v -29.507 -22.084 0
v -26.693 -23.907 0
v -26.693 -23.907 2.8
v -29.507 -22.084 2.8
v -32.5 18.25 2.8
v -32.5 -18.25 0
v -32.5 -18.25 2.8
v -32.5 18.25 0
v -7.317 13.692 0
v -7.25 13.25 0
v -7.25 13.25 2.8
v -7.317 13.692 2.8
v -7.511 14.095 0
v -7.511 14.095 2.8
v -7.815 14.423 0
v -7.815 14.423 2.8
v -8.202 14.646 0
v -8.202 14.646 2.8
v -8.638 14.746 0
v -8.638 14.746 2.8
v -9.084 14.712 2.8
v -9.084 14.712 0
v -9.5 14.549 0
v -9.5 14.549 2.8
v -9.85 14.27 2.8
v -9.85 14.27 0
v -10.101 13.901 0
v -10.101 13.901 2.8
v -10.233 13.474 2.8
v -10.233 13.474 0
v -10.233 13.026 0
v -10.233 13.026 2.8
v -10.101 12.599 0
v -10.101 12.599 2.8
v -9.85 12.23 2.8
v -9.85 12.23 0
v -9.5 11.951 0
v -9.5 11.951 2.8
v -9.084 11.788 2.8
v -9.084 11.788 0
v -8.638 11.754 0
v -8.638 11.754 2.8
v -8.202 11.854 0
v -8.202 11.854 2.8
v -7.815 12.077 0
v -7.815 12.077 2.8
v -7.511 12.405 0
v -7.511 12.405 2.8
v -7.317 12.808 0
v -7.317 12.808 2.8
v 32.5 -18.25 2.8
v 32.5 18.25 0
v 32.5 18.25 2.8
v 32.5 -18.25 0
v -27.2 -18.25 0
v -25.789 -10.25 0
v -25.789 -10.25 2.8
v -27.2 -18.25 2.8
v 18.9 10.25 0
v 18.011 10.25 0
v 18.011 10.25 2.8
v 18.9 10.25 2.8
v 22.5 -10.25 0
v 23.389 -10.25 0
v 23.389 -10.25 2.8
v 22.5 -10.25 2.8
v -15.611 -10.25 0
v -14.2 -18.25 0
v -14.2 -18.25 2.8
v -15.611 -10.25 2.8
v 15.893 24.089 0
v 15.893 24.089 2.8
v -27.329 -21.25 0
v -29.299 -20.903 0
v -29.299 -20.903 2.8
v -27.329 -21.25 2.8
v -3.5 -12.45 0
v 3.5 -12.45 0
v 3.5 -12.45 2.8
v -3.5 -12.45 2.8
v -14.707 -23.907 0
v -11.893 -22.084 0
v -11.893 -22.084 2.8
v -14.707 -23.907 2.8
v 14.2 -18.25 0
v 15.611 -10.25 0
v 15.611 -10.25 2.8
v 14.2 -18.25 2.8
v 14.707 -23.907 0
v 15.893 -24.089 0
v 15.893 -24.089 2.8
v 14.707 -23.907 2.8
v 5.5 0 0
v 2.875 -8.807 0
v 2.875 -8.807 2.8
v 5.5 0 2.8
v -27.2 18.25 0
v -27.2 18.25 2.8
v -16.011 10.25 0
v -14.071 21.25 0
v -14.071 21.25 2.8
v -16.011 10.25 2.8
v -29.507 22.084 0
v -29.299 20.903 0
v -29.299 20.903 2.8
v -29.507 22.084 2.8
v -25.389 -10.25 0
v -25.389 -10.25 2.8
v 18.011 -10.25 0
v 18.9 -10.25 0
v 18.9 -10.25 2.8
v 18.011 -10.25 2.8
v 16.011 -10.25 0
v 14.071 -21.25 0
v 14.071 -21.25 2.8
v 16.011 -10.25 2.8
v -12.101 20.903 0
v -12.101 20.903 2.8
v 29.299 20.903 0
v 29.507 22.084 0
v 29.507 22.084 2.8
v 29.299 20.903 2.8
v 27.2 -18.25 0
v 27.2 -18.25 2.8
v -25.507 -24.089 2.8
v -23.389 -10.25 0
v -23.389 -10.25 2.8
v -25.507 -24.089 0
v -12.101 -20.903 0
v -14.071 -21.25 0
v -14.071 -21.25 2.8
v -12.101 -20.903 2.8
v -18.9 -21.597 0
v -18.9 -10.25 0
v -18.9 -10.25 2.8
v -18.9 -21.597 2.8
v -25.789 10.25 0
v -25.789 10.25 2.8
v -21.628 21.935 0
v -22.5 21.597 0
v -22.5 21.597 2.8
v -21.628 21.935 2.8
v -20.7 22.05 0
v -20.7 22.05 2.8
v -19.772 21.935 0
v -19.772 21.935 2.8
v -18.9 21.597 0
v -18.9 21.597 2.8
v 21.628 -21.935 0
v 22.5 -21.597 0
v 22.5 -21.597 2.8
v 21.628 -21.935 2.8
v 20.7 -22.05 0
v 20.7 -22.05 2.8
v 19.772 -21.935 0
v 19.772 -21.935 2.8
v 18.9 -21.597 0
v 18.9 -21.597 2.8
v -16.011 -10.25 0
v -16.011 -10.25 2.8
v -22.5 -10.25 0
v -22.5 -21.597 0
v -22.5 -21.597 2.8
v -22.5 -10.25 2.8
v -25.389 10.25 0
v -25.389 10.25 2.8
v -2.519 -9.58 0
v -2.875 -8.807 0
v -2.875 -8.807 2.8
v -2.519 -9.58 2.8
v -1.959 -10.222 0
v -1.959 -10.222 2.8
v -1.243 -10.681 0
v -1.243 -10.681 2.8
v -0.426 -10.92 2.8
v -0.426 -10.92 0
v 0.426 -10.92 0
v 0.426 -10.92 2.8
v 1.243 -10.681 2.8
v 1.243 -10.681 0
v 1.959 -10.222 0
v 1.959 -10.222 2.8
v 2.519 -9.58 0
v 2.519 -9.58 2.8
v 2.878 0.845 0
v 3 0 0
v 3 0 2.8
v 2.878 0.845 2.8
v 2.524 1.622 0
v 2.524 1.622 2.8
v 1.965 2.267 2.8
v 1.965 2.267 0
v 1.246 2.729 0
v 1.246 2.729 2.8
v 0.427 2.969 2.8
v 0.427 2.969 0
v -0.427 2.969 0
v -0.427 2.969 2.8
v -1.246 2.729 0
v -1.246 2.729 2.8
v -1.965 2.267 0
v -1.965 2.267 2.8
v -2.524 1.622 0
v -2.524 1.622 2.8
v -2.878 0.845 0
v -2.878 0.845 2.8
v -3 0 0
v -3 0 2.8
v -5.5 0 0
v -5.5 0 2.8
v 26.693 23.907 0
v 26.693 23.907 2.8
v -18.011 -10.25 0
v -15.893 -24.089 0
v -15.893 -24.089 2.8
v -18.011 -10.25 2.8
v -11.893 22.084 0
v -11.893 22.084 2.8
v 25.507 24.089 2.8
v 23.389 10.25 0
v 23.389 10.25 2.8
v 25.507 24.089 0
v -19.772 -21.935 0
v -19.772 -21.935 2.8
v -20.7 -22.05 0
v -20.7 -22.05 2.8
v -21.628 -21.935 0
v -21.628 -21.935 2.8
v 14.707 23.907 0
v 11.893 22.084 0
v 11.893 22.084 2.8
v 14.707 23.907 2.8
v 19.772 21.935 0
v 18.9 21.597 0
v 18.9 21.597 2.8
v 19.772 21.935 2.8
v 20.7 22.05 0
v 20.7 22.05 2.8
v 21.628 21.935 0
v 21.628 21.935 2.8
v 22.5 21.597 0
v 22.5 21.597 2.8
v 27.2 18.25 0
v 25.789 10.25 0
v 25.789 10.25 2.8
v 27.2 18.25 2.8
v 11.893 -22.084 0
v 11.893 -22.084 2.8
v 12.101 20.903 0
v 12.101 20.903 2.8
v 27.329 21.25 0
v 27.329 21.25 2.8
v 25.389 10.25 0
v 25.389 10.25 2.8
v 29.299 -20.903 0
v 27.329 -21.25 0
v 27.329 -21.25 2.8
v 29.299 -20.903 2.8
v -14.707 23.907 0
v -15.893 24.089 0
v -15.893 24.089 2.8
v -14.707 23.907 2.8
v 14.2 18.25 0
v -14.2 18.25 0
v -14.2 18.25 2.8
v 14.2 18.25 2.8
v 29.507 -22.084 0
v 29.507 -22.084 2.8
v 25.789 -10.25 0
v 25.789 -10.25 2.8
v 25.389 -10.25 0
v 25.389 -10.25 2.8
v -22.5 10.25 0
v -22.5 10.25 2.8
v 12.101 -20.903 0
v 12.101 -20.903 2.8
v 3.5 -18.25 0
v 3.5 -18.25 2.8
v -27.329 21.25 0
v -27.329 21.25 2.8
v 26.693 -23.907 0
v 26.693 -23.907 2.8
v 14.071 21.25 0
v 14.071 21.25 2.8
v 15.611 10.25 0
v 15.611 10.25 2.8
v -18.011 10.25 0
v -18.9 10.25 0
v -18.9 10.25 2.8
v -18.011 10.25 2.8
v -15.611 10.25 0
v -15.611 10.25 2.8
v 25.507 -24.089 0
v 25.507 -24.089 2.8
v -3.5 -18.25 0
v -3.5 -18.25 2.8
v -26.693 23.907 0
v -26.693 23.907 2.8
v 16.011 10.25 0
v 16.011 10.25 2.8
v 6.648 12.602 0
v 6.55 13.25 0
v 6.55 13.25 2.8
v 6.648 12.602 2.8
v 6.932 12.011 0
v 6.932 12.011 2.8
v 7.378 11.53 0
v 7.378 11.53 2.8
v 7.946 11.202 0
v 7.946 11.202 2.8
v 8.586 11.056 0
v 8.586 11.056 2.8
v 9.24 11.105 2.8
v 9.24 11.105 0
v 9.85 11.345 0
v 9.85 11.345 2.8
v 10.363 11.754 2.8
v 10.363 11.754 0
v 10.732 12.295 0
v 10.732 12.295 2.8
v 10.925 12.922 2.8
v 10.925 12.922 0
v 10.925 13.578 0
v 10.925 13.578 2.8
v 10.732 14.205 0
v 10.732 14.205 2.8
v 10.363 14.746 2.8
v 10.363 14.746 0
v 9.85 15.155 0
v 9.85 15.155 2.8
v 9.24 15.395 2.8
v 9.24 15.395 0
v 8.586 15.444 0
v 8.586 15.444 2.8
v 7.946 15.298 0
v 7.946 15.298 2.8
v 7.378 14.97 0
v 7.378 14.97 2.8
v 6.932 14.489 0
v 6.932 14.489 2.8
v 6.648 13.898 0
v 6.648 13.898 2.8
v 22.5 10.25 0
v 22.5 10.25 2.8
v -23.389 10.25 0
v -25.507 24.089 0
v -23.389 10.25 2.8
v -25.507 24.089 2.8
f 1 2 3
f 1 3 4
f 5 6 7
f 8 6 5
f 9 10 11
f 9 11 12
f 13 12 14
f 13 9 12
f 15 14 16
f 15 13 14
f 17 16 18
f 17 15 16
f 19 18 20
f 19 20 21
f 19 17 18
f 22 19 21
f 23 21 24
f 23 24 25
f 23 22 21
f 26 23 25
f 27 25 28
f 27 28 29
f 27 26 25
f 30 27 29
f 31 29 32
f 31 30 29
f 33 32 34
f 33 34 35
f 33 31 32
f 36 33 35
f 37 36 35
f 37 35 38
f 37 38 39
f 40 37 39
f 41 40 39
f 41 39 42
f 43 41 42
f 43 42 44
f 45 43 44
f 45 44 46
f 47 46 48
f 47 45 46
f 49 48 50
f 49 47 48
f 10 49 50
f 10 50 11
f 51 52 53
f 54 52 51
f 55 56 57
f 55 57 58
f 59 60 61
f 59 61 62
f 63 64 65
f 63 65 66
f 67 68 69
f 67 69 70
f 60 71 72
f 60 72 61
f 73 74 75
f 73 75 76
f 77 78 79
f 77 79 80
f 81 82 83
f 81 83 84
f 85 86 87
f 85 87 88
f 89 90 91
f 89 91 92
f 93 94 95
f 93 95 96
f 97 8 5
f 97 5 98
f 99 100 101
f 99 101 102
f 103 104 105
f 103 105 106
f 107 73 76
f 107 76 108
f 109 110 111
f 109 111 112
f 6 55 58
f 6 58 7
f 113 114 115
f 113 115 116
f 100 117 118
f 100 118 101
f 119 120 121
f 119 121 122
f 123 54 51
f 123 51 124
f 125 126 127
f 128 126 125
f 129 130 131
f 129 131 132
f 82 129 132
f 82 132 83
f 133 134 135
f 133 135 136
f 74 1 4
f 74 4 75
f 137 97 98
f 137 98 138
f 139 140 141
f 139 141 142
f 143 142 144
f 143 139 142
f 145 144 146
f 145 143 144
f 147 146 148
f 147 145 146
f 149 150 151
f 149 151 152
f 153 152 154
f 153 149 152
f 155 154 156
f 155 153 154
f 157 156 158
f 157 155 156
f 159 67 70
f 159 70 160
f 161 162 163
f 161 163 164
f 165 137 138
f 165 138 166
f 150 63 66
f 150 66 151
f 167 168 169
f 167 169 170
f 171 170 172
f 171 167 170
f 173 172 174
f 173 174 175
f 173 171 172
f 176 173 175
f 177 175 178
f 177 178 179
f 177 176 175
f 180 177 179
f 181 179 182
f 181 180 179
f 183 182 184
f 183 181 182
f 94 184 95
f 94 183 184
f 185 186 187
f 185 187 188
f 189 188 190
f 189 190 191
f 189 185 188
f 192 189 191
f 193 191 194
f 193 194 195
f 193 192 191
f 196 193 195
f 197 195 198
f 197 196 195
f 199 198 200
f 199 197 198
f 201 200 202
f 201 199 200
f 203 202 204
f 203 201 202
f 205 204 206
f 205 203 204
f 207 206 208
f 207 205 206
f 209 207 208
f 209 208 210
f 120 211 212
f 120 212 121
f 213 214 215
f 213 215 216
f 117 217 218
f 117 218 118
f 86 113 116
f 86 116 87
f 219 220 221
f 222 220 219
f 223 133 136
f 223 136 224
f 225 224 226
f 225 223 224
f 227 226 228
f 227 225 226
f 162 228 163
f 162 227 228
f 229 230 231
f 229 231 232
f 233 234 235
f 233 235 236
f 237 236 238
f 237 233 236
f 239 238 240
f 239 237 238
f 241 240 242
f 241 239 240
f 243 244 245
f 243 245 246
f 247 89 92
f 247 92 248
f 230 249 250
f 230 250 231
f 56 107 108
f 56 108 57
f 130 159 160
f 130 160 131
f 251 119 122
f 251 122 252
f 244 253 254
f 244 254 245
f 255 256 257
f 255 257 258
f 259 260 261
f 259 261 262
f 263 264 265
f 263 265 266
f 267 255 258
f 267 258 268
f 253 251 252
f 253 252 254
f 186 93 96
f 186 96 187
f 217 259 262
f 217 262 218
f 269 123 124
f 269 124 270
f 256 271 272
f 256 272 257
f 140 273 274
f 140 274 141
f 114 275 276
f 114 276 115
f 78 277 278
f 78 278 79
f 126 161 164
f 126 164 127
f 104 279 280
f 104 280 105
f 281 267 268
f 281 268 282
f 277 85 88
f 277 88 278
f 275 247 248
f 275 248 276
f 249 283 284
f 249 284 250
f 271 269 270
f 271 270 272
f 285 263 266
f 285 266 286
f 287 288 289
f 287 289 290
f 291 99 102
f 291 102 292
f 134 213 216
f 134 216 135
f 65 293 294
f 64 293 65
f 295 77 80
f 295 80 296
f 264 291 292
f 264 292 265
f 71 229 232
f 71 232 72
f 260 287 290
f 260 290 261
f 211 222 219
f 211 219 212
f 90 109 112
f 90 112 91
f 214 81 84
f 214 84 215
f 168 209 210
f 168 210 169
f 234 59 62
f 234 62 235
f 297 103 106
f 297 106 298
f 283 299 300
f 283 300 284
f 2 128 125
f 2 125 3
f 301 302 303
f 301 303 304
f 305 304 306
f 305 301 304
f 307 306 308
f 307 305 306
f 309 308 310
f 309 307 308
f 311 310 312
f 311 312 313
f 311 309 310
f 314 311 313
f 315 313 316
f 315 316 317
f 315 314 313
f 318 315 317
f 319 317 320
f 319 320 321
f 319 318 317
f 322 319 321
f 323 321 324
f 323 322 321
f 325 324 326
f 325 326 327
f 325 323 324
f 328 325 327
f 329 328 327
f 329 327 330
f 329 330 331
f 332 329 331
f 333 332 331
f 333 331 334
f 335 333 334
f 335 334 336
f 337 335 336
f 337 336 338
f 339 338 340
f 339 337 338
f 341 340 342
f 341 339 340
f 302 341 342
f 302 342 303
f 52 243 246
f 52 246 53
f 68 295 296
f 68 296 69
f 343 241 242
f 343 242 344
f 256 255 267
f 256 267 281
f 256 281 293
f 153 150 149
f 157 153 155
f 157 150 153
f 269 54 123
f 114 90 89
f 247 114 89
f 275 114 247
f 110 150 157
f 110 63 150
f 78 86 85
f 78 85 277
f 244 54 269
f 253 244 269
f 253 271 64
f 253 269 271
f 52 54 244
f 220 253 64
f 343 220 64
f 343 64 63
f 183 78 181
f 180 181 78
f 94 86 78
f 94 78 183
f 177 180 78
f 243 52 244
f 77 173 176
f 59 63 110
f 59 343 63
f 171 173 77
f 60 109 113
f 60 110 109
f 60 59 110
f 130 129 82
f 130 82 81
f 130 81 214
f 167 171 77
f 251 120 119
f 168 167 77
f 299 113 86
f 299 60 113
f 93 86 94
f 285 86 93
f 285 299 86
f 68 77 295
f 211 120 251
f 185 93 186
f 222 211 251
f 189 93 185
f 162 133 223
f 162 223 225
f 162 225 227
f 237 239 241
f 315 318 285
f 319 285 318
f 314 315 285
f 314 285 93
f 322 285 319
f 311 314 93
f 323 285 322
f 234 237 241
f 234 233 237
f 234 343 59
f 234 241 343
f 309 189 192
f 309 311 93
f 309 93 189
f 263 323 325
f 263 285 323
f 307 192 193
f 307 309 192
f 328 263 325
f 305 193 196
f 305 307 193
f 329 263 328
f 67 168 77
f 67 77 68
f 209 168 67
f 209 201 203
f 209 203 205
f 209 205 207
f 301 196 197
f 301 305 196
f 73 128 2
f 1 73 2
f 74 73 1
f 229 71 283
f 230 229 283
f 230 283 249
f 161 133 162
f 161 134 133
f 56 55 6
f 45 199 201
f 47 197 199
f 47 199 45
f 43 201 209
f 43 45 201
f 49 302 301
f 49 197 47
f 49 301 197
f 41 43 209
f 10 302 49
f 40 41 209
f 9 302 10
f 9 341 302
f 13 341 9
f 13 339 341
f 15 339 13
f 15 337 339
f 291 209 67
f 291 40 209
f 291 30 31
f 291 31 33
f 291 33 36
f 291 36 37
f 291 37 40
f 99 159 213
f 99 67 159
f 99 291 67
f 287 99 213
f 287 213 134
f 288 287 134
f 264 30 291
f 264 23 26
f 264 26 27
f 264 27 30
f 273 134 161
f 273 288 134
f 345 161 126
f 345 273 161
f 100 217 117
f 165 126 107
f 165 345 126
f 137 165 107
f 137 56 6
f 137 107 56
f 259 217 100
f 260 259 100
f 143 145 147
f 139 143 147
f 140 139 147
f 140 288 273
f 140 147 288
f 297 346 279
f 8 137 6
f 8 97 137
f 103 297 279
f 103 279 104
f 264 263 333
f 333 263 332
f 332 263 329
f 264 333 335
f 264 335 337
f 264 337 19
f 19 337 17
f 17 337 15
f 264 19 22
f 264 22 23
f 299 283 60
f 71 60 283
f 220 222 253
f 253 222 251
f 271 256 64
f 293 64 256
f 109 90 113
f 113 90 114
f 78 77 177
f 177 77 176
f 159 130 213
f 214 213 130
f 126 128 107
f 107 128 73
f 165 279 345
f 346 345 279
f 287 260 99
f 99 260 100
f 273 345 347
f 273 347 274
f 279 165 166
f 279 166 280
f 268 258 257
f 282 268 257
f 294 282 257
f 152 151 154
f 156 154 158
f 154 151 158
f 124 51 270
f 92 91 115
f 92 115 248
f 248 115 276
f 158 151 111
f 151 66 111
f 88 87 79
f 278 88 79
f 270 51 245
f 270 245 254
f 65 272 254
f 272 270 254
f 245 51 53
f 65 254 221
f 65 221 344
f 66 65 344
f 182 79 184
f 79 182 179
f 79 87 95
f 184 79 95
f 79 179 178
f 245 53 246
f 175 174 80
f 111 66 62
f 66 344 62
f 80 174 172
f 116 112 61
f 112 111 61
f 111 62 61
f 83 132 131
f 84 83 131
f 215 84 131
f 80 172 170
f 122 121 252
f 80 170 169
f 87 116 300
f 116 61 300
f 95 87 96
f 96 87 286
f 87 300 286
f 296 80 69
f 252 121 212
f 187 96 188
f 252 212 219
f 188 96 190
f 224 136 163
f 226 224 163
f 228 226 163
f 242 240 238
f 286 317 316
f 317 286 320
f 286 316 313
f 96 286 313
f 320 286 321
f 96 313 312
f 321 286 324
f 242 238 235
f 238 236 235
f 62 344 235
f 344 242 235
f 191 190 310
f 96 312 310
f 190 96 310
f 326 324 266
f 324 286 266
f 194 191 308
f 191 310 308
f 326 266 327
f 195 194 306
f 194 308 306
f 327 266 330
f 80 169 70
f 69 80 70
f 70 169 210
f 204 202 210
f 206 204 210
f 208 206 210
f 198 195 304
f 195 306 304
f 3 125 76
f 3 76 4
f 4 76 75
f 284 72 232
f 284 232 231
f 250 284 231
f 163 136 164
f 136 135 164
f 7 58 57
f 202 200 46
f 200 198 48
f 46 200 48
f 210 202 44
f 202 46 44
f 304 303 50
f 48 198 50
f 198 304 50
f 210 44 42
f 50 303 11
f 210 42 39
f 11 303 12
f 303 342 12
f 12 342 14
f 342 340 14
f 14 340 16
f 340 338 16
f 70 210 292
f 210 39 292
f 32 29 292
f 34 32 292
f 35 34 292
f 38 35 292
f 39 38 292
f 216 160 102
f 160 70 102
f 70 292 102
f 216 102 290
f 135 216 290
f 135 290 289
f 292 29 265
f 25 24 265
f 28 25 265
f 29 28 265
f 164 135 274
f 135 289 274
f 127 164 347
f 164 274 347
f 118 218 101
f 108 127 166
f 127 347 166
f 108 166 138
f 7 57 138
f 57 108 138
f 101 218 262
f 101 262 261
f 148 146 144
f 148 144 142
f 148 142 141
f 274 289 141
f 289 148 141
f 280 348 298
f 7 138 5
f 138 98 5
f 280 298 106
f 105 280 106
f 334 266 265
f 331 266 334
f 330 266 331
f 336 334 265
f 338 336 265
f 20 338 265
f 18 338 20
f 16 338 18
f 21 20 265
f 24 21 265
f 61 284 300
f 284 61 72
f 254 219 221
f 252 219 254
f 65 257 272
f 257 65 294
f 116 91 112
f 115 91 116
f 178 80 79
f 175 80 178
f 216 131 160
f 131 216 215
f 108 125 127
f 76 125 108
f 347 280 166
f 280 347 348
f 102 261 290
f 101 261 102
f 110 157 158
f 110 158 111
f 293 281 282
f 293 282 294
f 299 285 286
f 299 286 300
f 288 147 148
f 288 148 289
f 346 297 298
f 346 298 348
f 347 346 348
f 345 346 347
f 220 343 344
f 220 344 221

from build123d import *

# Parameters (mm, degrees)
MODEL_R                 = 1.5
MODEL_R_2               = 2.2
P_IDAT_VYSUNUT_M1_DEPTH = 2.8


with BuildPart() as part:
    # Model → Přidat vysunutím1 (new body)
    with BuildSketch(Plane.XY):
        with BuildLine():
            Line((-14.2, 18.25), (14.2, 18.25))
            Line((14.2, 18.25), (15.610615846, 10.25))
            Line((15.610615846, 10.25), (16.010615846, 10.25))
            Line((16.010615846, 10.25), (14.071019058, 21.25))
            Line((14.071019058, 21.25), (12.101403552, 20.902703645))
            Line((12.101403552, 20.902703645), (11.893025739, 22.084472948))
            Line((11.893025739, 22.084472948), (14.706771698, 23.907401431))
            Line((14.706771698, 23.907401431), (15.892964362, 24.088914415))
            Line((15.892964362, 24.088914415), (18.010615846, 10.25))
            Line((18.010615846, 10.25), (18.9, 10.25))
            Line((18.9, 10.25), (18.9, 21.596640106))
            ThreePointArc((18.9, 21.596640106), (20.7, 22.05), (22.5, 21.596640106))
            Line((22.5, 21.596640106), (22.5, 10.25))
            Line((22.5, 10.25), (23.389384154, 10.25))
            Line((23.389384154, 10.25), (25.507035638, 24.088914415))
            Line((25.507035638, 24.088914415), (26.693228302, 23.907401431))
            Line((26.693228302, 23.907401431), (29.506974261, 22.084472948))
            Line((29.506974261, 22.084472948), (29.298596448, 20.902703645))
            Line((29.298596448, 20.902703645), (27.328980942, 21.25))
            Line((27.328980942, 21.25), (25.389384154, 10.25))
            Line((25.389384154, 10.25), (25.789384154, 10.25))
            Line((25.789384154, 10.25), (27.2, 18.25))
            Line((27.2, 18.25), (32.5, 18.25))
            Line((32.5, 18.25), (32.5, -18.25))
            Line((32.5, -18.25), (27.2, -18.25))
            Line((27.2, -18.25), (25.789384154, -10.25))
            Line((25.789384154, -10.25), (25.389384154, -10.25))
            Line((25.389384154, -10.25), (27.328980942, -21.25))
            Line((27.328980942, -21.25), (29.298596448, -20.902703645))
            Line((29.298596448, -20.902703645), (29.506974261, -22.084472948))
            Line((29.506974261, -22.084472948), (26.693228302, -23.907401431))
            Line((26.693228302, -23.907401431), (25.507035638, -24.088914415))
            Line((25.507035638, -24.088914415), (23.389384154, -10.25))
            Line((23.389384154, -10.25), (22.5, -10.25))
            Line((22.5, -10.25), (22.5, -21.596640106))
            ThreePointArc((22.5, -21.596640106), (20.7, -22.05), (18.9, -21.596640106))
            Line((18.9, -21.596640106), (18.9, -10.25))
            Line((18.9, -10.25), (18.010615846, -10.25))
            Line((18.010615846, -10.25), (15.892964362, -24.088914415))
            Line((15.892964362, -24.088914415), (14.706771698, -23.907401431))
            Line((14.706771698, -23.907401431), (11.893025739, -22.084472948))
            Line((11.893025739, -22.084472948), (12.101403552, -20.902703645))
            Line((12.101403552, -20.902703645), (14.071019058, -21.25))
            Line((14.071019058, -21.25), (16.010615846, -10.25))
            Line((16.010615846, -10.25), (15.610615846, -10.25))
            Line((15.610615846, -10.25), (14.2, -18.25))
            Line((14.2, -18.25), (3.5, -18.25))
            Line((3.5, -18.25), (3.5, -12.45))
            Line((3.5, -12.45), (-3.5, -12.45))
            Line((-3.5, -12.45), (-3.5, -18.25))
            Line((-3.5, -18.25), (-14.2, -18.25))
            Line((-14.2, -18.25), (-15.610615846, -10.25))
            Line((-15.610615846, -10.25), (-16.010615846, -10.25))
            Line((-16.010615846, -10.25), (-14.071019058, -21.25))
            Line((-14.071019058, -21.25), (-12.101403552, -20.902703645))
            Line((-12.101403552, -20.902703645), (-11.893025739, -22.084472948))
            Line((-11.893025739, -22.084472948), (-14.706771698, -23.907401431))
            Line((-14.706771698, -23.907401431), (-15.892964362, -24.088914415))
            Line((-15.892964362, -24.088914415), (-18.010615846, -10.25))
            Line((-18.010615846, -10.25), (-18.9, -10.25))
            Line((-18.9, -10.25), (-18.9, -21.596640106))
            ThreePointArc((-18.9, -21.596640106), (-20.7, -22.05), (-22.5, -21.596640106))
            Line((-22.5, -21.596640106), (-22.5, -10.25))
            Line((-22.5, -10.25), (-23.389384154, -10.25))
            Line((-23.389384154, -10.25), (-25.507035638, -24.088914415))
            Line((-25.507035638, -24.088914415), (-26.693228302, -23.907401431))
            Line((-26.693228302, -23.907401431), (-29.506974261, -22.084472948))
            Line((-29.506974261, -22.084472948), (-29.298596448, -20.902703645))
            Line((-29.298596448, -20.902703645), (-27.328980942, -21.25))
            Line((-27.328980942, -21.25), (-25.389384154, -10.25))
            Line((-25.389384154, -10.25), (-25.789384154, -10.25))
            Line((-25.789384154, -10.25), (-27.2, -18.25))
            Line((-27.2, -18.25), (-32.5, -18.25))
            Line((-32.5, -18.25), (-32.5, 18.25))
            Line((-32.5, 18.25), (-27.2, 18.25))
            Line((-27.2, 18.25), (-25.789384154, 10.25))
            Line((-25.789384154, 10.25), (-25.389384154, 10.25))
            Line((-25.389384154, 10.25), (-27.328980942, 21.25))
            Line((-27.328980942, 21.25), (-29.298596448, 20.902703645))
            Line((-29.298596448, 20.902703645), (-29.506974261, 22.084472948))
            Line((-29.506974261, 22.084472948), (-26.693228302, 23.907401431))
            Line((-26.693228302, 23.907401431), (-25.507035638, 24.088914415))
            Line((-25.507035638, 24.088914415), (-23.389384154, 10.25))
            Line((-23.389384154, 10.25), (-22.5, 10.25))
            Line((-22.5, 10.25), (-22.5, 21.596640106))
            ThreePointArc((-22.5, 21.596640106), (-20.7, 22.05), (-18.9, 21.596640106))
            Line((-18.9, 21.596640106), (-18.9, 10.25))
            Line((-18.9, 10.25), (-18.010615846, 10.25))
            Line((-18.010615846, 10.25), (-15.892964362, 24.088914415))
            Line((-15.892964362, 24.088914415), (-14.706771698, 23.907401431))
            Line((-14.706771698, 23.907401431), (-11.893025739, 22.084472948))
            Line((-11.893025739, 22.084472948), (-12.101403552, 20.902703645))
            Line((-12.101403552, 20.902703645), (-14.071019058, 21.25))
            Line((-14.071019058, 21.25), (-16.010615846, 10.25))
            Line((-16.010615846, 10.25), (-15.610615846, 10.25))
            Line((-15.610615846, 10.25), (-14.2, 18.25))
        make_face()
        with Locations((-8.75, 13.25)):
            Circle(MODEL_R, mode=Mode.SUBTRACT)
        with Locations(Location((8.75, 13.25, 0), (0, 0, 180))):
            Circle(MODEL_R_2, mode=Mode.SUBTRACT)
        with BuildLine():
            Line((2.875009535, -8.806924836), (5.5, 0))
            Line((5.5, 0), (3, 0))
            ThreePointArc((3, 0), (0, 3), (-3, 0))
            Line((-3, 0), (-5.5, 0))
            Line((-5.5, 0), (-2.875009535, -8.806924836))
            ThreePointArc((-2.875009535, -8.806924836), (0, -10.95), (2.875009535, -8.806924836))
        make_face(mode=Mode.SUBTRACT)
    extrude(amount=P_IDAT_VYSUNUT_M1_DEPTH)


solid = part.part
